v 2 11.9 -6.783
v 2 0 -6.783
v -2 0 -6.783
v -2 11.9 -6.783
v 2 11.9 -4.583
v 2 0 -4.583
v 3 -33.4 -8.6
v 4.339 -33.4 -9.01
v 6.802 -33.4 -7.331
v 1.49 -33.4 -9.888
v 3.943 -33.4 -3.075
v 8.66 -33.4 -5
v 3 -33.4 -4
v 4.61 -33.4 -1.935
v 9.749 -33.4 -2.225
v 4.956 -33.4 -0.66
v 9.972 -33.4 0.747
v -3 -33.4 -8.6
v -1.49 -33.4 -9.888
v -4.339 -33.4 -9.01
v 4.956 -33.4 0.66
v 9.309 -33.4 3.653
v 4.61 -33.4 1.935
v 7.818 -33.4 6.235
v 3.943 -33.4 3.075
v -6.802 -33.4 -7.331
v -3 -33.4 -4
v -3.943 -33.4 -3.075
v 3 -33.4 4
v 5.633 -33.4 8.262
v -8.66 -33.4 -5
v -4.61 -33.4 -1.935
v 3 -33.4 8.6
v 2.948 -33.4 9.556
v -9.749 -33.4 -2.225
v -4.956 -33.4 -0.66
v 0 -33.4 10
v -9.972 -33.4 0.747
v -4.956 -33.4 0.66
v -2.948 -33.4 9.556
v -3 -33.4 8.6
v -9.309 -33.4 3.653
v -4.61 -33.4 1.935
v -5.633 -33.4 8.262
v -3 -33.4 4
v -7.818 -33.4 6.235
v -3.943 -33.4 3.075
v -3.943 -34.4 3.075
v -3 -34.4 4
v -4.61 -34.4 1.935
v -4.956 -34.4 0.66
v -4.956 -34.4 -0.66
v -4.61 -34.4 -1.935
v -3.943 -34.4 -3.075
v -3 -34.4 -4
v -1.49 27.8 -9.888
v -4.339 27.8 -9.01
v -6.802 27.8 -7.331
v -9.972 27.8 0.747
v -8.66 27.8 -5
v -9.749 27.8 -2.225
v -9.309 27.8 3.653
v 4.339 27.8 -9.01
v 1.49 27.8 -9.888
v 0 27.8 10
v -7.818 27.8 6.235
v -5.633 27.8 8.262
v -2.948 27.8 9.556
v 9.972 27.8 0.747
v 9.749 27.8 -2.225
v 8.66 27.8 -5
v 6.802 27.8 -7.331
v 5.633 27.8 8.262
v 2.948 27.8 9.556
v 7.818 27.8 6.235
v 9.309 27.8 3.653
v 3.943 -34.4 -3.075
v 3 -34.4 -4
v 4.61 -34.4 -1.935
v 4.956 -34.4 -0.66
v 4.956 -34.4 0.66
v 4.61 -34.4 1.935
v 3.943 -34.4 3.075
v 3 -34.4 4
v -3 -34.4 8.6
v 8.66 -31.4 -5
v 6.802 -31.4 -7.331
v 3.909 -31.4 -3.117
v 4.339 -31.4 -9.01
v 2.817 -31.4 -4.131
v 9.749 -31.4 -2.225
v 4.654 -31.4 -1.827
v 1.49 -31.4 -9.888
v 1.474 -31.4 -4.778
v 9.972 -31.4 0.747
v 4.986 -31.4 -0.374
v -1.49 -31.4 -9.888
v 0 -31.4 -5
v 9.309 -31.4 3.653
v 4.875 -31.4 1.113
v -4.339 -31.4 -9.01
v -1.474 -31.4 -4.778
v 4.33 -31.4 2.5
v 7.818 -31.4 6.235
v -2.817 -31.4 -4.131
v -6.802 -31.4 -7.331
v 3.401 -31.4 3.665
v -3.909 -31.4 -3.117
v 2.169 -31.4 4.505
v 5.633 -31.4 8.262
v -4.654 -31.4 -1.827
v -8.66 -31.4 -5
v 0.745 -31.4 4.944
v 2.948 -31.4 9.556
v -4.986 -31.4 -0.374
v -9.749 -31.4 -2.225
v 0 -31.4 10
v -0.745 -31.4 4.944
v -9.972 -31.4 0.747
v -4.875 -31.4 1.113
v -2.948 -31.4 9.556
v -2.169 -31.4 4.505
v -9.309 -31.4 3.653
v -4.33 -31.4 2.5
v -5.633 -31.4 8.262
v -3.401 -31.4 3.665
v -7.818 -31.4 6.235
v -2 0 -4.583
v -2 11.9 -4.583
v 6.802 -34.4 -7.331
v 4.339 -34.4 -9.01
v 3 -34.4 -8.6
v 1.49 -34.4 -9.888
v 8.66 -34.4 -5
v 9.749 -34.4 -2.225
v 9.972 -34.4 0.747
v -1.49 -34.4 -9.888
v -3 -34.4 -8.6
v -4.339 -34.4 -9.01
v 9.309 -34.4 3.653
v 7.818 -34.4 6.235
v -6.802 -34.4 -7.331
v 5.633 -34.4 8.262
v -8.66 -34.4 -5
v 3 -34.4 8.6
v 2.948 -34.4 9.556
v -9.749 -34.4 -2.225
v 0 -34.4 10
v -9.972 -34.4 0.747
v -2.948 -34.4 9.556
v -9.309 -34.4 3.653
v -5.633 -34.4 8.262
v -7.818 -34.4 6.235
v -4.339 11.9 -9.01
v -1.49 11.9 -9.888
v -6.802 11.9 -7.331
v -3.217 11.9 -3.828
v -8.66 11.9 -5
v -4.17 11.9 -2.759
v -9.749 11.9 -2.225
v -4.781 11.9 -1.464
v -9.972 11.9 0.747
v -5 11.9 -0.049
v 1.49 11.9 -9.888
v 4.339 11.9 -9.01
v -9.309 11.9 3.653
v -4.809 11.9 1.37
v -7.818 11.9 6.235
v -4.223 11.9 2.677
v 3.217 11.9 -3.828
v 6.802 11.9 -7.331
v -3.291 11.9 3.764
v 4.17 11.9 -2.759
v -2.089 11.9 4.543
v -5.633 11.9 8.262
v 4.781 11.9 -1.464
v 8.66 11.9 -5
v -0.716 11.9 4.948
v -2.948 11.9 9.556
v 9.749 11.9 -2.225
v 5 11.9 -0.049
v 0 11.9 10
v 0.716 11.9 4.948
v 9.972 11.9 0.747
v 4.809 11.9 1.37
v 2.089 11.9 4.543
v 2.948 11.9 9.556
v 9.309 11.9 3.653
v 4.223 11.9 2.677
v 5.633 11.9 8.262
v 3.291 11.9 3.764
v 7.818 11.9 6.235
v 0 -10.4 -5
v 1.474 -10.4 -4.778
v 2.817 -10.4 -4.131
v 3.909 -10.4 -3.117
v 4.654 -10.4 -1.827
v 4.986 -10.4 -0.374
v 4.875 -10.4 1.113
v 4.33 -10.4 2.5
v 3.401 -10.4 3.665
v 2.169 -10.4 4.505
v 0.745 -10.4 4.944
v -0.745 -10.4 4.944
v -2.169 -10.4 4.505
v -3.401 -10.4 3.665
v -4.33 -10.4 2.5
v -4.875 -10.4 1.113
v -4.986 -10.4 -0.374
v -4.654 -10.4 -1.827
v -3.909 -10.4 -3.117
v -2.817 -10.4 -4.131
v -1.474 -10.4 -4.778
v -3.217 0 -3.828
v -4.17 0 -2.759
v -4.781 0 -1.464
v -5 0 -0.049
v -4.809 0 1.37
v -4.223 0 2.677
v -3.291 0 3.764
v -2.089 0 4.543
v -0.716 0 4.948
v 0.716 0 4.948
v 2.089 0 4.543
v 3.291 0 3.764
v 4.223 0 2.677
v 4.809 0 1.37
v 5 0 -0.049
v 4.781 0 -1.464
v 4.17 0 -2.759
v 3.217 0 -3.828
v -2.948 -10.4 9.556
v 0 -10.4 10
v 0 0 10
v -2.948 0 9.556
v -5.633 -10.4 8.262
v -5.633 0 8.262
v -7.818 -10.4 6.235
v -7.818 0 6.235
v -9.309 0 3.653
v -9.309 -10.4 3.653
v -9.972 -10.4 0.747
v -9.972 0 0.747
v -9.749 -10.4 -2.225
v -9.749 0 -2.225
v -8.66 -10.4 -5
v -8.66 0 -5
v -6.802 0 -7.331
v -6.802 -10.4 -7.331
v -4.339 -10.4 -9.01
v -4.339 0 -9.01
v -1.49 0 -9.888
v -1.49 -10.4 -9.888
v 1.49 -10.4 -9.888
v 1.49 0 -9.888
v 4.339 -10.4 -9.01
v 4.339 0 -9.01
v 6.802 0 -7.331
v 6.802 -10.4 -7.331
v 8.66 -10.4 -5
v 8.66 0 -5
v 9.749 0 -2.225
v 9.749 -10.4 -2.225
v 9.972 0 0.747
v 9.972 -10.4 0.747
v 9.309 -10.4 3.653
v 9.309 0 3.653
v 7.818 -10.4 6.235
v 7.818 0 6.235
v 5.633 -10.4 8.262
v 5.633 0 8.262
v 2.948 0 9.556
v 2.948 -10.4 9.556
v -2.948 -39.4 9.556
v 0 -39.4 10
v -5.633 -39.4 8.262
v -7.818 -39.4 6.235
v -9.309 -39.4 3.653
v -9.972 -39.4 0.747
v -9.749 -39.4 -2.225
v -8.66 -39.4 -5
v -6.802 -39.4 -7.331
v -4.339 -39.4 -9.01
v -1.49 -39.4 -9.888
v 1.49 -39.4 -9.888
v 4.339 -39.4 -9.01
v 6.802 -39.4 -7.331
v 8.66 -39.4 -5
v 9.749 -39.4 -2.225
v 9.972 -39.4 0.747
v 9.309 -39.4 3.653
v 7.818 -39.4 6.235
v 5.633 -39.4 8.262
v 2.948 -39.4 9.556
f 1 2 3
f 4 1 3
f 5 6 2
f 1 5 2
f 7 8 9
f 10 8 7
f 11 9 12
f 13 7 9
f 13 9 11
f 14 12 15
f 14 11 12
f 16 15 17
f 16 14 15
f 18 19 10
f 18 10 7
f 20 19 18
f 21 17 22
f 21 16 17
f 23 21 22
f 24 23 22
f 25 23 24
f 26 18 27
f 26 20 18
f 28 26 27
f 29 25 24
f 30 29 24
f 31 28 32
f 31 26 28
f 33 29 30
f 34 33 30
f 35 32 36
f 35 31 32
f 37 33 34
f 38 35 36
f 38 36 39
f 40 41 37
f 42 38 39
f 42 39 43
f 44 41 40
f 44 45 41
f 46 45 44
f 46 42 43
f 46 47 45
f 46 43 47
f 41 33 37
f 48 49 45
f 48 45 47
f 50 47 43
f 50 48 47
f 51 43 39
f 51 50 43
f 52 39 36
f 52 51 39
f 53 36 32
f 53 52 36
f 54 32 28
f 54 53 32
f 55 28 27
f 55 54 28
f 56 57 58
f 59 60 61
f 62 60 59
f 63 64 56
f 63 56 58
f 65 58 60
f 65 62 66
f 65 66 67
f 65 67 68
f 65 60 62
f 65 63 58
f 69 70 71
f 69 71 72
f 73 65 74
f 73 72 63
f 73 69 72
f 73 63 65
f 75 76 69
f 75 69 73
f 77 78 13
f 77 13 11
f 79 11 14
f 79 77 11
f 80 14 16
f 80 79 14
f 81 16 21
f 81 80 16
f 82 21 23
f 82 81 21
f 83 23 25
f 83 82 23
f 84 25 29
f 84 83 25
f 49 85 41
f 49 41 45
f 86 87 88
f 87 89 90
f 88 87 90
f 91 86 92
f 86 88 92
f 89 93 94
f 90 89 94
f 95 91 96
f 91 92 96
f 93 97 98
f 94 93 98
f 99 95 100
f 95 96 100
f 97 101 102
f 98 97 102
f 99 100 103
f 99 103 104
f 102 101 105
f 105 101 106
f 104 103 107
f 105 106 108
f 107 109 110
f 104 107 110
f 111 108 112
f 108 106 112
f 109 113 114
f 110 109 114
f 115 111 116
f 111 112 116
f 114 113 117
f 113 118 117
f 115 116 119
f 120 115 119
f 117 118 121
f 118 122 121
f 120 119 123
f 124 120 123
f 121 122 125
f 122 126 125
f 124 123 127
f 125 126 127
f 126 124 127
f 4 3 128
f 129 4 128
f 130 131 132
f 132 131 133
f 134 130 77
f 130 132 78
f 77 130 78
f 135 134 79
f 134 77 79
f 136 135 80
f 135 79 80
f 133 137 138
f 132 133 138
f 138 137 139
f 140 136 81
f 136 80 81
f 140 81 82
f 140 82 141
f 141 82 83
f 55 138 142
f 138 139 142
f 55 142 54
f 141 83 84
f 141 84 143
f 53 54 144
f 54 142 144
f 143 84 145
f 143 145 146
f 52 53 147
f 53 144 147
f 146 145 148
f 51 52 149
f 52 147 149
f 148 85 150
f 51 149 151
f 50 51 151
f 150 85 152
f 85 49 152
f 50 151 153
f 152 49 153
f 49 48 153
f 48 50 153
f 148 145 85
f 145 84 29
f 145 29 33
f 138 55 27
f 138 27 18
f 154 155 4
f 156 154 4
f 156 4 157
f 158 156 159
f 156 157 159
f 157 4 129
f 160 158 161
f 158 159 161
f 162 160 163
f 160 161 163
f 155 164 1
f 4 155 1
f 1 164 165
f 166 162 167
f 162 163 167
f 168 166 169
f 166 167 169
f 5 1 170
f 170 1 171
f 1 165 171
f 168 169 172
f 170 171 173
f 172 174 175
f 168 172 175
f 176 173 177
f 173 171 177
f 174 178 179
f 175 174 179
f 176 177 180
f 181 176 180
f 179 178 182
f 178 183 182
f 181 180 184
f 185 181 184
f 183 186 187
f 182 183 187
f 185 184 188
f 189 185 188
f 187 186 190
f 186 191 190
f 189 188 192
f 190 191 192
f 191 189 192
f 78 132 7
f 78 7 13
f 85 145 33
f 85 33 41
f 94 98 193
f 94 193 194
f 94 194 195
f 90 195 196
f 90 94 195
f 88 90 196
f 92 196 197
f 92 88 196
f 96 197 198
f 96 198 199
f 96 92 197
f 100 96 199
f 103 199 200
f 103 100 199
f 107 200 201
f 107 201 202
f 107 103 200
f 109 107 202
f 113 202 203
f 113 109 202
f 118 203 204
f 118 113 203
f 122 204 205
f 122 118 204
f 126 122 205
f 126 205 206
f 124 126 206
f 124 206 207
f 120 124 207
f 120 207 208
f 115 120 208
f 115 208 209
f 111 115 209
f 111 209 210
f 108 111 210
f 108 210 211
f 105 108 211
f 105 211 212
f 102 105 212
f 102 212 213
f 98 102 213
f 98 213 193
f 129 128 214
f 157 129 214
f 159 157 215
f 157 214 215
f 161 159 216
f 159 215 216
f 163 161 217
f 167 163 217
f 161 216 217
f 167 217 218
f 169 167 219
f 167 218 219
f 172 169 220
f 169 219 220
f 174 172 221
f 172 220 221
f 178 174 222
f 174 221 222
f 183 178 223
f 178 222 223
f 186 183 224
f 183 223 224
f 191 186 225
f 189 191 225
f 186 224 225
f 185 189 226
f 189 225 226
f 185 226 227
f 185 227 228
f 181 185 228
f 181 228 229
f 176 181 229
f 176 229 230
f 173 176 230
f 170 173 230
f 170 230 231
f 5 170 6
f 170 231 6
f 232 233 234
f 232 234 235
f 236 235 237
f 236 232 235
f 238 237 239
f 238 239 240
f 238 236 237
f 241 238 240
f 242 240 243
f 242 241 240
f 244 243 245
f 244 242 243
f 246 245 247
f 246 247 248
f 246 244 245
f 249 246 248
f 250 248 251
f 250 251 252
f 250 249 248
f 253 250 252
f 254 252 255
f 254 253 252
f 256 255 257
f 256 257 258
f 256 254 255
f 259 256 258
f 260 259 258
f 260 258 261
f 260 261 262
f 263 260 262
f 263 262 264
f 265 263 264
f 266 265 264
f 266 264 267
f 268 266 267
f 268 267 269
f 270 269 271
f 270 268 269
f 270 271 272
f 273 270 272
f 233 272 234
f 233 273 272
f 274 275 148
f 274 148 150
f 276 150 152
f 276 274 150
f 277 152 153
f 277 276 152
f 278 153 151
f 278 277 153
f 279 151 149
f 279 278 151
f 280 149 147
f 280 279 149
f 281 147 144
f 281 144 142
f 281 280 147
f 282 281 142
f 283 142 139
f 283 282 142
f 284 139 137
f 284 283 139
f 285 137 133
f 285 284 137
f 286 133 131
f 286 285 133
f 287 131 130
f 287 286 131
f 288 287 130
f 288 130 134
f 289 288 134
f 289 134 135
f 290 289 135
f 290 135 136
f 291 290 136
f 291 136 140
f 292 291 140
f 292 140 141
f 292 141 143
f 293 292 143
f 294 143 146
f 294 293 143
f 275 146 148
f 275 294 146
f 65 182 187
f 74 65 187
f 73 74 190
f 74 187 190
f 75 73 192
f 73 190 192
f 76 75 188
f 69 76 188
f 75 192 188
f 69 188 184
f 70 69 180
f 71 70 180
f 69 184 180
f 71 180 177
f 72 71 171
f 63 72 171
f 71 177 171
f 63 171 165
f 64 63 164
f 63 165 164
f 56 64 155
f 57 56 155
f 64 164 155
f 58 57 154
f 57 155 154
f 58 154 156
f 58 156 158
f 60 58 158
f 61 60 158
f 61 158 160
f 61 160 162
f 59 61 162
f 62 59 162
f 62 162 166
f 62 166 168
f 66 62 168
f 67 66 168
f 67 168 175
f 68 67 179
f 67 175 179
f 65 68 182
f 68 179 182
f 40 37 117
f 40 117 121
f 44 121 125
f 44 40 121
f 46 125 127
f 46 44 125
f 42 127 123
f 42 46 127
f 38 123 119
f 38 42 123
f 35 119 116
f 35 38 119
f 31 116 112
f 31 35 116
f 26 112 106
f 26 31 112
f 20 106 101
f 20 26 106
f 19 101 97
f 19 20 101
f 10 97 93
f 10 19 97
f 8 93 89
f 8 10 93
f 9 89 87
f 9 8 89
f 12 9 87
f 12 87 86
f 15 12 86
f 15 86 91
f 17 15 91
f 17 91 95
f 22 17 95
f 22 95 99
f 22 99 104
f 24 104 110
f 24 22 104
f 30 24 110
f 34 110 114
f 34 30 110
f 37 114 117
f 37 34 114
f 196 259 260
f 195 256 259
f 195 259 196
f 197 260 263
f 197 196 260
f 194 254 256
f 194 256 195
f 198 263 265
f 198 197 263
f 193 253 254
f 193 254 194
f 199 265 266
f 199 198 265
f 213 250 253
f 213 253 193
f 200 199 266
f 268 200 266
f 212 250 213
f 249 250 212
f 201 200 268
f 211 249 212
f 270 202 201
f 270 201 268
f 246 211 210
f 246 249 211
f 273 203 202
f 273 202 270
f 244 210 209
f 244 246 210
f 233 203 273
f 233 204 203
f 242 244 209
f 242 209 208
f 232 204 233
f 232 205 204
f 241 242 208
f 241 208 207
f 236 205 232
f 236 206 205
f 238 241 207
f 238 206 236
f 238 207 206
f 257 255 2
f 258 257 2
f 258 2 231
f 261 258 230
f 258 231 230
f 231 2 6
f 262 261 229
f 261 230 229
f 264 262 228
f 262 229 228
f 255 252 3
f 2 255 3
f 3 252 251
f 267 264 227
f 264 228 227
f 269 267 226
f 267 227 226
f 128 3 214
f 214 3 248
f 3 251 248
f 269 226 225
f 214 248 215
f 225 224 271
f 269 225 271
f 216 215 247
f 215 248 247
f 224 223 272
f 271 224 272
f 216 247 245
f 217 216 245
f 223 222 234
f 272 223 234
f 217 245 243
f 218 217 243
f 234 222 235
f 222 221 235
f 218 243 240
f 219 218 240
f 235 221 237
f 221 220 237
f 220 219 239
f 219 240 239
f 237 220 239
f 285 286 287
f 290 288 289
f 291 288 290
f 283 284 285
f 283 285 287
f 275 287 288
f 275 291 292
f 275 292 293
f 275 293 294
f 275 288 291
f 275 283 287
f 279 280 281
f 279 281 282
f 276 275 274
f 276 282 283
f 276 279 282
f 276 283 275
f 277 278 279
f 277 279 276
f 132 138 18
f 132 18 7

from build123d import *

# Parameters (mm, degrees)
SKETCH1_R           = 5
BOSS_EXTRUDE2_DEPTH = 11.9
SKETCH3_R           = 10
BOSS_EXTRUDE3_DEPTH = 15.9
BOSS_EXTRUDE4_START = 10.4
SKETCH5_R           = 10
BOSS_EXTRUDE4_DEPTH = 10.4
BOSS_EXTRUDE5_START = 23
SKETCH6_R           = 5
BOSS_EXTRUDE5_DEPTH = 23
SKETCH7_R           = 10
SKETCH7_R_2         = 5
BOSS_EXTRUDE6_DEPTH = 2
BOSS_EXTRUDE7_START = 1
SKETCH8_R           = 5
BOSS_EXTRUDE7_DEPTH = 1
BOSS_EXTRUDE8_START = 5
SKETCH9_R           = 10
BOSS_EXTRUDE8_DEPTH = 5


with BuildPart() as part:
    # Sketch1 → Boss-Extrude2 (new body)
    with BuildSketch(Plane(origin=(0, 0, 0), x_dir=(1, 0, 0), z_dir=(0, 1, 0))):
        Circle(SKETCH1_R)
        with BuildLine():
            Line((-2, 6.782575695), (-2, 4.582575695))
            ThreePointArc((-2, 4.582575695), (0, 5), (2, 4.582575695))
            Line((2, 4.582575695), (2, 6.782575695))
            Line((2, 6.782575695), (-2, 6.782575695))
        make_face()
    extrude(amount=BOSS_EXTRUDE2_DEPTH)

    # Sketch3 → Boss-Extrude3 (add)
    with BuildSketch(Plane(origin=(0, 11.9, 0), x_dir=(1, 0, 0), z_dir=(0, 1, 0))):
        with Locations(Location((0, 0, 0), (0, 0, 270))):
            Circle(SKETCH3_R)
    extrude(amount=BOSS_EXTRUDE3_DEPTH)

    # Sketch5 → Boss-Extrude4 (add)
    with BuildSketch(Plane.XZ.offset(BOSS_EXTRUDE4_START)):
        with Locations(Location((0, 0, 0), (0, 0, 90))):
            Circle(SKETCH5_R)
    extrude(amount=-BOSS_EXTRUDE4_DEPTH)

    # Sketch6 → Boss-Extrude5 (add)
    with BuildSketch(Plane.XZ.offset(10.4).offset(BOSS_EXTRUDE5_START)):
        with Locations(Location((0, 0, 0), (0, 0, 270))):
            Circle(SKETCH6_R)
    extrude(amount=-BOSS_EXTRUDE5_DEPTH)

    # Sketch7 → Boss-Extrude6 (add)
    with BuildSketch(Plane.XZ.offset(33.4)):
        with Locations(Location((0, 0, 0), (0, 0, 90))):
            Circle(SKETCH7_R)
        with Locations(Location((0, 0, 0), (0, 0, 270))):
            Circle(SKETCH7_R_2, mode=Mode.SUBTRACT)
    extrude(amount=-BOSS_EXTRUDE6_DEPTH)

    # Sketch8 → Boss-Extrude7 (add)
    with BuildSketch(Plane.XZ.offset(33.4).offset(BOSS_EXTRUDE7_START)):
        with Locations(Location((0, 0, 0), (0, 0, 270))):
            Circle(SKETCH8_R)
        with BuildLine():
            Line((-3, 8.6), (-3, 4))
            ThreePointArc((-3, 4), (0, 5), (3, 4))
            Line((3, 4), (3, 8.6))
            Line((3, 8.6), (-3, 8.6))
        make_face()
        with BuildLine():
            ThreePointArc((3, -4), (0, -5), (-3, -4))
            Line((-3, -4), (-3, -8.6))
            Line((-3, -8.6), (3, -8.6))
            Line((3, -8.6), (3, -4))
        make_face()
    extrude(amount=-BOSS_EXTRUDE7_DEPTH)

    # Sketch9 → Boss-Extrude8 (add)
    with BuildSketch(Plane(origin=(0, -34.4, 0), x_dir=(-1, 0, 0), z_dir=(0, -1, 0)).offset(BOSS_EXTRUDE8_START)):
        with Locations(Location((0, 0, 0), (0, 0, 270))):
            Circle(SKETCH9_R)
    extrude(amount=-BOSS_EXTRUDE8_DEPTH)


solid = part.part
